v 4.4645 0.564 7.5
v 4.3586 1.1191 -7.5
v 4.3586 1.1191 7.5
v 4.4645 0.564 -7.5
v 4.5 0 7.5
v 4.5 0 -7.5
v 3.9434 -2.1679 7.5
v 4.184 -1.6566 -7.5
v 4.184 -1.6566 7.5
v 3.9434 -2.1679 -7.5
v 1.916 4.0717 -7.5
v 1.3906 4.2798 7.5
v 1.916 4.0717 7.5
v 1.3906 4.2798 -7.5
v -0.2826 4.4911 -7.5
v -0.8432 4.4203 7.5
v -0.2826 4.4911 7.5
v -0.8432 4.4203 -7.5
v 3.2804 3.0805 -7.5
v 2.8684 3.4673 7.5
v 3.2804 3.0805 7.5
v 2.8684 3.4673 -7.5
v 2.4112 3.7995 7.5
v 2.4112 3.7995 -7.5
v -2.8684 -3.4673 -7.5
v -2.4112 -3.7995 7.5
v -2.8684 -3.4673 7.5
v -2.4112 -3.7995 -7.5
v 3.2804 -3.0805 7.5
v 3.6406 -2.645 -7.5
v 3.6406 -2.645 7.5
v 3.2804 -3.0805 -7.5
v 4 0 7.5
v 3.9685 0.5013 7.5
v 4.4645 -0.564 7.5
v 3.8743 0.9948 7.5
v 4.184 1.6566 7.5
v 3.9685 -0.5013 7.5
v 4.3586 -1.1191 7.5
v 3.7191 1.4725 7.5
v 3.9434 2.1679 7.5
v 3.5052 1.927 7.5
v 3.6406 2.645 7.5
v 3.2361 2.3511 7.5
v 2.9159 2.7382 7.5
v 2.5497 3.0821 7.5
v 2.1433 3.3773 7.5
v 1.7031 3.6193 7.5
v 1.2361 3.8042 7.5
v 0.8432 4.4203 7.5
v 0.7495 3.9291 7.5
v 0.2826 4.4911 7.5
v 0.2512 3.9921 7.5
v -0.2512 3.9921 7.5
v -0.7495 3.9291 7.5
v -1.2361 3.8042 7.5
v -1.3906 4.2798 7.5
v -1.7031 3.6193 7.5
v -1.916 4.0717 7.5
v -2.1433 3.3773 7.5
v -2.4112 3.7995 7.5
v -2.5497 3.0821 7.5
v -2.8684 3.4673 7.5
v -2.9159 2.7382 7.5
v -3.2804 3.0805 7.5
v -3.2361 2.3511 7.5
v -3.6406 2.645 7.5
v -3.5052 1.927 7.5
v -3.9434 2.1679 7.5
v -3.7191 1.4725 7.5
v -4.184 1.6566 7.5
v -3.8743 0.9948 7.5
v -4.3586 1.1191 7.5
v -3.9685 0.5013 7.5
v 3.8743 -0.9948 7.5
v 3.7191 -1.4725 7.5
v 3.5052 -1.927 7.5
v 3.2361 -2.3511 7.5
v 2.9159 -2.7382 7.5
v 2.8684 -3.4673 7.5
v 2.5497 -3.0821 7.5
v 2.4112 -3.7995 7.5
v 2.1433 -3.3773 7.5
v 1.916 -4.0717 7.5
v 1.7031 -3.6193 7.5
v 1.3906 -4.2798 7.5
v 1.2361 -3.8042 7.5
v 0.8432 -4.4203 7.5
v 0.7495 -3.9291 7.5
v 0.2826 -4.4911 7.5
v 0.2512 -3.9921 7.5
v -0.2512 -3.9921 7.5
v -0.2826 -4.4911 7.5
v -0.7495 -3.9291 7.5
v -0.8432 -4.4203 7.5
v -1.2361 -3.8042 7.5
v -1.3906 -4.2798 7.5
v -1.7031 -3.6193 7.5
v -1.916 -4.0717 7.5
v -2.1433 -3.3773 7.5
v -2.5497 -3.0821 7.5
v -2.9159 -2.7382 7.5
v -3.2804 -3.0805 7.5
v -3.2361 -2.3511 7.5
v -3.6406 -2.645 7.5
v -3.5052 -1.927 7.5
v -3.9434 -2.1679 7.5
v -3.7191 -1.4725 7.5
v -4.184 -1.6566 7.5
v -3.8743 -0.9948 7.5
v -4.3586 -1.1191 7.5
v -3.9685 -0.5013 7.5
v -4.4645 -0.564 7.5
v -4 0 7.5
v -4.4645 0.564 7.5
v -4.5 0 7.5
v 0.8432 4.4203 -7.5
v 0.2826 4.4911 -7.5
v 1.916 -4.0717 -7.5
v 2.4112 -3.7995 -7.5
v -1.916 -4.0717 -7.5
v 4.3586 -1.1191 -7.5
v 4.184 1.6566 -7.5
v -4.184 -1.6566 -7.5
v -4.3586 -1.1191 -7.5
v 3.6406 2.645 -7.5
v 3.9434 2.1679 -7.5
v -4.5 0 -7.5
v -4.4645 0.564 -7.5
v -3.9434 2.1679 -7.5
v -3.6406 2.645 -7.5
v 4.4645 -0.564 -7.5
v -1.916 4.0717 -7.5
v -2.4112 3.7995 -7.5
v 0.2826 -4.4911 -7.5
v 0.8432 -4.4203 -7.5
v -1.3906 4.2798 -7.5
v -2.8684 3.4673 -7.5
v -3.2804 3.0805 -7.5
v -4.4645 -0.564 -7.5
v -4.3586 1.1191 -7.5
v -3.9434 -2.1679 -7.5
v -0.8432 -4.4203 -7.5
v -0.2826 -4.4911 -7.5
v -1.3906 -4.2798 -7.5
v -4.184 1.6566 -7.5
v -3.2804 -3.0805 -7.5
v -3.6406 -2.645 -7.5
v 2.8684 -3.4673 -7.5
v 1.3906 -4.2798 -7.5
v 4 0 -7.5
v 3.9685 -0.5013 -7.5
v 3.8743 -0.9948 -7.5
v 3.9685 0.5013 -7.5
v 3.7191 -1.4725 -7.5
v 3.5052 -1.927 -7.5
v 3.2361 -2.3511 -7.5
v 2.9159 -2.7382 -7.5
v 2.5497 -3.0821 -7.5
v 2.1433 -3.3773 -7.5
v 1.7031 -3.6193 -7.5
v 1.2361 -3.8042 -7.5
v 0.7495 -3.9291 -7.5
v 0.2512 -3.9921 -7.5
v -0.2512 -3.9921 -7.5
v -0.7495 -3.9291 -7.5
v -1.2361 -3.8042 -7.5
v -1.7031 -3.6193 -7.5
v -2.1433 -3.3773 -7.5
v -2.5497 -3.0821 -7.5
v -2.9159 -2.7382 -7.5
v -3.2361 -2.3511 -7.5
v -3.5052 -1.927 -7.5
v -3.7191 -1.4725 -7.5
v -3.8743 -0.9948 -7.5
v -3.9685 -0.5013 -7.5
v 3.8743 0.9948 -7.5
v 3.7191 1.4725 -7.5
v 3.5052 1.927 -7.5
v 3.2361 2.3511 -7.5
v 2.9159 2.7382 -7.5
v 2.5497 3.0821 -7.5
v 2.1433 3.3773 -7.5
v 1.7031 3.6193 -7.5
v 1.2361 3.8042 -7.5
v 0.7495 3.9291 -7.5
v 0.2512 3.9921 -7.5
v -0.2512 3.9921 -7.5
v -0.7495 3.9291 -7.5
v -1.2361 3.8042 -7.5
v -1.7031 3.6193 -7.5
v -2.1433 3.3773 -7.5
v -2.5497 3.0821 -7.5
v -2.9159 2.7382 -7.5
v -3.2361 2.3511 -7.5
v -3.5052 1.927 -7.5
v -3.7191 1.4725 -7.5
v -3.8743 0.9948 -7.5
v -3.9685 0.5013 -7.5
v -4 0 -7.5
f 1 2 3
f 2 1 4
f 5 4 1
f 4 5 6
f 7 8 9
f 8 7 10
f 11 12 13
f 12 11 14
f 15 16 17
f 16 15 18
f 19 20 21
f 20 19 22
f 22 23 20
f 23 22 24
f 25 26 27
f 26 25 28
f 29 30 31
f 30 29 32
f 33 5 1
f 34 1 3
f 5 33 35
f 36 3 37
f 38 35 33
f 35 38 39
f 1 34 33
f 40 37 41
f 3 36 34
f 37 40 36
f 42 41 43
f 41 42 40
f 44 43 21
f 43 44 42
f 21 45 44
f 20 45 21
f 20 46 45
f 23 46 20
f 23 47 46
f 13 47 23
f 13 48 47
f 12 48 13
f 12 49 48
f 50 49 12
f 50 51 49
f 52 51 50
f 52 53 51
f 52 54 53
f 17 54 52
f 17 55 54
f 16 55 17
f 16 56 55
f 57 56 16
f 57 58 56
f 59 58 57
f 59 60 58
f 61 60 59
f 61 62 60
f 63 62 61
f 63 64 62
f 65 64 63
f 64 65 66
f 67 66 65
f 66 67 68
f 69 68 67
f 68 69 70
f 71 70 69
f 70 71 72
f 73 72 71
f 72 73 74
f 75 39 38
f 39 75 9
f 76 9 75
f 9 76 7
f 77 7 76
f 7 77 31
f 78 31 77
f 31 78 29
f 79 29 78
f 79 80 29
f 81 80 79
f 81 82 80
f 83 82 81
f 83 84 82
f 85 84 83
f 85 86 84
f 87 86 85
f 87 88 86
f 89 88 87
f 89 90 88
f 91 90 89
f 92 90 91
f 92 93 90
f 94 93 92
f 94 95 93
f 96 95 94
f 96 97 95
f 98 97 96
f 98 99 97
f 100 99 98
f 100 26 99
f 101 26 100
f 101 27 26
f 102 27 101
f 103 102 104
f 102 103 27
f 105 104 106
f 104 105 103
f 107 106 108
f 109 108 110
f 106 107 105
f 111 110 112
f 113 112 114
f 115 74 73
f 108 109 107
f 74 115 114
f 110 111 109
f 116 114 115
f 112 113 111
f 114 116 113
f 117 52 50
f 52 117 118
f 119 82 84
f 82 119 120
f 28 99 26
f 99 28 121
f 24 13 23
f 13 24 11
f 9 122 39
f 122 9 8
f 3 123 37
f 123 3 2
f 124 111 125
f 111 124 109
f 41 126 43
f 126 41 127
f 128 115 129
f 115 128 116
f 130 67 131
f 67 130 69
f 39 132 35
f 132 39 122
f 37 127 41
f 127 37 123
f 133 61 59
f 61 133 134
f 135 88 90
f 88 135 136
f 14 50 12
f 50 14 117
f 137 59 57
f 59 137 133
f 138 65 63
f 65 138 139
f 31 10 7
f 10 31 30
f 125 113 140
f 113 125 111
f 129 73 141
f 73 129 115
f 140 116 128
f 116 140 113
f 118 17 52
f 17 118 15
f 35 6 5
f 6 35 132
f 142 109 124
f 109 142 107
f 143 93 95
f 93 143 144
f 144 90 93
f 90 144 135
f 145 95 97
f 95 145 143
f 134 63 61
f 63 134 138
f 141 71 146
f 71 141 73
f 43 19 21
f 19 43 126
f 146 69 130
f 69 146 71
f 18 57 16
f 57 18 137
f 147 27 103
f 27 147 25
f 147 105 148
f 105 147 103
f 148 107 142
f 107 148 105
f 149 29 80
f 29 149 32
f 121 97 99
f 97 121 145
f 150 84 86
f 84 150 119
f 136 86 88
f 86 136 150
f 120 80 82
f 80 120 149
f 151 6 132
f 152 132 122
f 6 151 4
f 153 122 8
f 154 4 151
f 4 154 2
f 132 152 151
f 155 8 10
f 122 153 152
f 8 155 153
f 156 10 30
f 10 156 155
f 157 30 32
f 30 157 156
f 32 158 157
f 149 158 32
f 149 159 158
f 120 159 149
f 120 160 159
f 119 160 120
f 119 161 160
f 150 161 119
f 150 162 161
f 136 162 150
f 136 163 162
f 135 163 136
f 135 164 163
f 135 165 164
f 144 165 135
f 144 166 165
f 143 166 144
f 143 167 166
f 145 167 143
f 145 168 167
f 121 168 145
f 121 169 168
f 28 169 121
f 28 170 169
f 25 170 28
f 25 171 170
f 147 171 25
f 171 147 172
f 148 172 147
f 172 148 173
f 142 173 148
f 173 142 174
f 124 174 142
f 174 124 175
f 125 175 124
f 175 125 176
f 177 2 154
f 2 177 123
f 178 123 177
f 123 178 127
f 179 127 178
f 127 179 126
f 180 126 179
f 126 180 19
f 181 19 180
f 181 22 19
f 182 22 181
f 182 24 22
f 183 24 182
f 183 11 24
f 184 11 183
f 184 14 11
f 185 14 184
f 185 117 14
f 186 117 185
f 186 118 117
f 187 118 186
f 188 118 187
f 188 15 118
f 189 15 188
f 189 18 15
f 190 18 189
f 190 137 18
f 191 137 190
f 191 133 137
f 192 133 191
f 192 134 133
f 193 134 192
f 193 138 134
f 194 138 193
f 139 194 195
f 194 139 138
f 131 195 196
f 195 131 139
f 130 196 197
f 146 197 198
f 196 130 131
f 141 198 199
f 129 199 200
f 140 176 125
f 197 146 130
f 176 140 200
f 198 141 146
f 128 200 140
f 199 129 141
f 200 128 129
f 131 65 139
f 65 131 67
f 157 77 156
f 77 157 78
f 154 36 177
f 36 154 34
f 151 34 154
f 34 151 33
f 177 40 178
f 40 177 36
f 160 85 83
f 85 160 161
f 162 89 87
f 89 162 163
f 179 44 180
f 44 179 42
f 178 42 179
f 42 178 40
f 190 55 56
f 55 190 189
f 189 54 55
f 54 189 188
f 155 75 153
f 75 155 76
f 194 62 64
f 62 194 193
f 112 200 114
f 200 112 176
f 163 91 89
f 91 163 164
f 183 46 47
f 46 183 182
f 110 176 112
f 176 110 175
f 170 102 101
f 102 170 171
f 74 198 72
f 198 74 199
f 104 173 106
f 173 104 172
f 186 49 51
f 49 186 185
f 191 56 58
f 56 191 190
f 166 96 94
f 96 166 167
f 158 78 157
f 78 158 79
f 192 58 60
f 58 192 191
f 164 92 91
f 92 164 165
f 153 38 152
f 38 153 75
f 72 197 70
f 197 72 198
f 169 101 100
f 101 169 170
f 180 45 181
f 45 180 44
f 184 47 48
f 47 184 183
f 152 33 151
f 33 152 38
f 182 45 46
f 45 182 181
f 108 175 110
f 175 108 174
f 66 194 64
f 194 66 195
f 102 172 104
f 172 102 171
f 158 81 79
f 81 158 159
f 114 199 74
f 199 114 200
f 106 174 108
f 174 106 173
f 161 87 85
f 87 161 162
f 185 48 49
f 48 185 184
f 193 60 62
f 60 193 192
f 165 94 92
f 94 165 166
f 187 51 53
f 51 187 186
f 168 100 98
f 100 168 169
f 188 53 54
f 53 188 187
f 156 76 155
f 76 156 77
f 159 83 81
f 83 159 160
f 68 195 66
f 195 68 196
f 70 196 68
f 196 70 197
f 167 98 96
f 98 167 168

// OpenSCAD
$fn = 50;


difference() {
	union() {
		translate(v = [0, 0, -7.5000000000]) {
			cylinder(h = 15, r = 4.5000000000);
		}
	}
	union() {
		translate(v = [0, 0, -100.0000000000]) {
			cylinder(h = 200, r = 4.0000000000);
		}
	}
}
